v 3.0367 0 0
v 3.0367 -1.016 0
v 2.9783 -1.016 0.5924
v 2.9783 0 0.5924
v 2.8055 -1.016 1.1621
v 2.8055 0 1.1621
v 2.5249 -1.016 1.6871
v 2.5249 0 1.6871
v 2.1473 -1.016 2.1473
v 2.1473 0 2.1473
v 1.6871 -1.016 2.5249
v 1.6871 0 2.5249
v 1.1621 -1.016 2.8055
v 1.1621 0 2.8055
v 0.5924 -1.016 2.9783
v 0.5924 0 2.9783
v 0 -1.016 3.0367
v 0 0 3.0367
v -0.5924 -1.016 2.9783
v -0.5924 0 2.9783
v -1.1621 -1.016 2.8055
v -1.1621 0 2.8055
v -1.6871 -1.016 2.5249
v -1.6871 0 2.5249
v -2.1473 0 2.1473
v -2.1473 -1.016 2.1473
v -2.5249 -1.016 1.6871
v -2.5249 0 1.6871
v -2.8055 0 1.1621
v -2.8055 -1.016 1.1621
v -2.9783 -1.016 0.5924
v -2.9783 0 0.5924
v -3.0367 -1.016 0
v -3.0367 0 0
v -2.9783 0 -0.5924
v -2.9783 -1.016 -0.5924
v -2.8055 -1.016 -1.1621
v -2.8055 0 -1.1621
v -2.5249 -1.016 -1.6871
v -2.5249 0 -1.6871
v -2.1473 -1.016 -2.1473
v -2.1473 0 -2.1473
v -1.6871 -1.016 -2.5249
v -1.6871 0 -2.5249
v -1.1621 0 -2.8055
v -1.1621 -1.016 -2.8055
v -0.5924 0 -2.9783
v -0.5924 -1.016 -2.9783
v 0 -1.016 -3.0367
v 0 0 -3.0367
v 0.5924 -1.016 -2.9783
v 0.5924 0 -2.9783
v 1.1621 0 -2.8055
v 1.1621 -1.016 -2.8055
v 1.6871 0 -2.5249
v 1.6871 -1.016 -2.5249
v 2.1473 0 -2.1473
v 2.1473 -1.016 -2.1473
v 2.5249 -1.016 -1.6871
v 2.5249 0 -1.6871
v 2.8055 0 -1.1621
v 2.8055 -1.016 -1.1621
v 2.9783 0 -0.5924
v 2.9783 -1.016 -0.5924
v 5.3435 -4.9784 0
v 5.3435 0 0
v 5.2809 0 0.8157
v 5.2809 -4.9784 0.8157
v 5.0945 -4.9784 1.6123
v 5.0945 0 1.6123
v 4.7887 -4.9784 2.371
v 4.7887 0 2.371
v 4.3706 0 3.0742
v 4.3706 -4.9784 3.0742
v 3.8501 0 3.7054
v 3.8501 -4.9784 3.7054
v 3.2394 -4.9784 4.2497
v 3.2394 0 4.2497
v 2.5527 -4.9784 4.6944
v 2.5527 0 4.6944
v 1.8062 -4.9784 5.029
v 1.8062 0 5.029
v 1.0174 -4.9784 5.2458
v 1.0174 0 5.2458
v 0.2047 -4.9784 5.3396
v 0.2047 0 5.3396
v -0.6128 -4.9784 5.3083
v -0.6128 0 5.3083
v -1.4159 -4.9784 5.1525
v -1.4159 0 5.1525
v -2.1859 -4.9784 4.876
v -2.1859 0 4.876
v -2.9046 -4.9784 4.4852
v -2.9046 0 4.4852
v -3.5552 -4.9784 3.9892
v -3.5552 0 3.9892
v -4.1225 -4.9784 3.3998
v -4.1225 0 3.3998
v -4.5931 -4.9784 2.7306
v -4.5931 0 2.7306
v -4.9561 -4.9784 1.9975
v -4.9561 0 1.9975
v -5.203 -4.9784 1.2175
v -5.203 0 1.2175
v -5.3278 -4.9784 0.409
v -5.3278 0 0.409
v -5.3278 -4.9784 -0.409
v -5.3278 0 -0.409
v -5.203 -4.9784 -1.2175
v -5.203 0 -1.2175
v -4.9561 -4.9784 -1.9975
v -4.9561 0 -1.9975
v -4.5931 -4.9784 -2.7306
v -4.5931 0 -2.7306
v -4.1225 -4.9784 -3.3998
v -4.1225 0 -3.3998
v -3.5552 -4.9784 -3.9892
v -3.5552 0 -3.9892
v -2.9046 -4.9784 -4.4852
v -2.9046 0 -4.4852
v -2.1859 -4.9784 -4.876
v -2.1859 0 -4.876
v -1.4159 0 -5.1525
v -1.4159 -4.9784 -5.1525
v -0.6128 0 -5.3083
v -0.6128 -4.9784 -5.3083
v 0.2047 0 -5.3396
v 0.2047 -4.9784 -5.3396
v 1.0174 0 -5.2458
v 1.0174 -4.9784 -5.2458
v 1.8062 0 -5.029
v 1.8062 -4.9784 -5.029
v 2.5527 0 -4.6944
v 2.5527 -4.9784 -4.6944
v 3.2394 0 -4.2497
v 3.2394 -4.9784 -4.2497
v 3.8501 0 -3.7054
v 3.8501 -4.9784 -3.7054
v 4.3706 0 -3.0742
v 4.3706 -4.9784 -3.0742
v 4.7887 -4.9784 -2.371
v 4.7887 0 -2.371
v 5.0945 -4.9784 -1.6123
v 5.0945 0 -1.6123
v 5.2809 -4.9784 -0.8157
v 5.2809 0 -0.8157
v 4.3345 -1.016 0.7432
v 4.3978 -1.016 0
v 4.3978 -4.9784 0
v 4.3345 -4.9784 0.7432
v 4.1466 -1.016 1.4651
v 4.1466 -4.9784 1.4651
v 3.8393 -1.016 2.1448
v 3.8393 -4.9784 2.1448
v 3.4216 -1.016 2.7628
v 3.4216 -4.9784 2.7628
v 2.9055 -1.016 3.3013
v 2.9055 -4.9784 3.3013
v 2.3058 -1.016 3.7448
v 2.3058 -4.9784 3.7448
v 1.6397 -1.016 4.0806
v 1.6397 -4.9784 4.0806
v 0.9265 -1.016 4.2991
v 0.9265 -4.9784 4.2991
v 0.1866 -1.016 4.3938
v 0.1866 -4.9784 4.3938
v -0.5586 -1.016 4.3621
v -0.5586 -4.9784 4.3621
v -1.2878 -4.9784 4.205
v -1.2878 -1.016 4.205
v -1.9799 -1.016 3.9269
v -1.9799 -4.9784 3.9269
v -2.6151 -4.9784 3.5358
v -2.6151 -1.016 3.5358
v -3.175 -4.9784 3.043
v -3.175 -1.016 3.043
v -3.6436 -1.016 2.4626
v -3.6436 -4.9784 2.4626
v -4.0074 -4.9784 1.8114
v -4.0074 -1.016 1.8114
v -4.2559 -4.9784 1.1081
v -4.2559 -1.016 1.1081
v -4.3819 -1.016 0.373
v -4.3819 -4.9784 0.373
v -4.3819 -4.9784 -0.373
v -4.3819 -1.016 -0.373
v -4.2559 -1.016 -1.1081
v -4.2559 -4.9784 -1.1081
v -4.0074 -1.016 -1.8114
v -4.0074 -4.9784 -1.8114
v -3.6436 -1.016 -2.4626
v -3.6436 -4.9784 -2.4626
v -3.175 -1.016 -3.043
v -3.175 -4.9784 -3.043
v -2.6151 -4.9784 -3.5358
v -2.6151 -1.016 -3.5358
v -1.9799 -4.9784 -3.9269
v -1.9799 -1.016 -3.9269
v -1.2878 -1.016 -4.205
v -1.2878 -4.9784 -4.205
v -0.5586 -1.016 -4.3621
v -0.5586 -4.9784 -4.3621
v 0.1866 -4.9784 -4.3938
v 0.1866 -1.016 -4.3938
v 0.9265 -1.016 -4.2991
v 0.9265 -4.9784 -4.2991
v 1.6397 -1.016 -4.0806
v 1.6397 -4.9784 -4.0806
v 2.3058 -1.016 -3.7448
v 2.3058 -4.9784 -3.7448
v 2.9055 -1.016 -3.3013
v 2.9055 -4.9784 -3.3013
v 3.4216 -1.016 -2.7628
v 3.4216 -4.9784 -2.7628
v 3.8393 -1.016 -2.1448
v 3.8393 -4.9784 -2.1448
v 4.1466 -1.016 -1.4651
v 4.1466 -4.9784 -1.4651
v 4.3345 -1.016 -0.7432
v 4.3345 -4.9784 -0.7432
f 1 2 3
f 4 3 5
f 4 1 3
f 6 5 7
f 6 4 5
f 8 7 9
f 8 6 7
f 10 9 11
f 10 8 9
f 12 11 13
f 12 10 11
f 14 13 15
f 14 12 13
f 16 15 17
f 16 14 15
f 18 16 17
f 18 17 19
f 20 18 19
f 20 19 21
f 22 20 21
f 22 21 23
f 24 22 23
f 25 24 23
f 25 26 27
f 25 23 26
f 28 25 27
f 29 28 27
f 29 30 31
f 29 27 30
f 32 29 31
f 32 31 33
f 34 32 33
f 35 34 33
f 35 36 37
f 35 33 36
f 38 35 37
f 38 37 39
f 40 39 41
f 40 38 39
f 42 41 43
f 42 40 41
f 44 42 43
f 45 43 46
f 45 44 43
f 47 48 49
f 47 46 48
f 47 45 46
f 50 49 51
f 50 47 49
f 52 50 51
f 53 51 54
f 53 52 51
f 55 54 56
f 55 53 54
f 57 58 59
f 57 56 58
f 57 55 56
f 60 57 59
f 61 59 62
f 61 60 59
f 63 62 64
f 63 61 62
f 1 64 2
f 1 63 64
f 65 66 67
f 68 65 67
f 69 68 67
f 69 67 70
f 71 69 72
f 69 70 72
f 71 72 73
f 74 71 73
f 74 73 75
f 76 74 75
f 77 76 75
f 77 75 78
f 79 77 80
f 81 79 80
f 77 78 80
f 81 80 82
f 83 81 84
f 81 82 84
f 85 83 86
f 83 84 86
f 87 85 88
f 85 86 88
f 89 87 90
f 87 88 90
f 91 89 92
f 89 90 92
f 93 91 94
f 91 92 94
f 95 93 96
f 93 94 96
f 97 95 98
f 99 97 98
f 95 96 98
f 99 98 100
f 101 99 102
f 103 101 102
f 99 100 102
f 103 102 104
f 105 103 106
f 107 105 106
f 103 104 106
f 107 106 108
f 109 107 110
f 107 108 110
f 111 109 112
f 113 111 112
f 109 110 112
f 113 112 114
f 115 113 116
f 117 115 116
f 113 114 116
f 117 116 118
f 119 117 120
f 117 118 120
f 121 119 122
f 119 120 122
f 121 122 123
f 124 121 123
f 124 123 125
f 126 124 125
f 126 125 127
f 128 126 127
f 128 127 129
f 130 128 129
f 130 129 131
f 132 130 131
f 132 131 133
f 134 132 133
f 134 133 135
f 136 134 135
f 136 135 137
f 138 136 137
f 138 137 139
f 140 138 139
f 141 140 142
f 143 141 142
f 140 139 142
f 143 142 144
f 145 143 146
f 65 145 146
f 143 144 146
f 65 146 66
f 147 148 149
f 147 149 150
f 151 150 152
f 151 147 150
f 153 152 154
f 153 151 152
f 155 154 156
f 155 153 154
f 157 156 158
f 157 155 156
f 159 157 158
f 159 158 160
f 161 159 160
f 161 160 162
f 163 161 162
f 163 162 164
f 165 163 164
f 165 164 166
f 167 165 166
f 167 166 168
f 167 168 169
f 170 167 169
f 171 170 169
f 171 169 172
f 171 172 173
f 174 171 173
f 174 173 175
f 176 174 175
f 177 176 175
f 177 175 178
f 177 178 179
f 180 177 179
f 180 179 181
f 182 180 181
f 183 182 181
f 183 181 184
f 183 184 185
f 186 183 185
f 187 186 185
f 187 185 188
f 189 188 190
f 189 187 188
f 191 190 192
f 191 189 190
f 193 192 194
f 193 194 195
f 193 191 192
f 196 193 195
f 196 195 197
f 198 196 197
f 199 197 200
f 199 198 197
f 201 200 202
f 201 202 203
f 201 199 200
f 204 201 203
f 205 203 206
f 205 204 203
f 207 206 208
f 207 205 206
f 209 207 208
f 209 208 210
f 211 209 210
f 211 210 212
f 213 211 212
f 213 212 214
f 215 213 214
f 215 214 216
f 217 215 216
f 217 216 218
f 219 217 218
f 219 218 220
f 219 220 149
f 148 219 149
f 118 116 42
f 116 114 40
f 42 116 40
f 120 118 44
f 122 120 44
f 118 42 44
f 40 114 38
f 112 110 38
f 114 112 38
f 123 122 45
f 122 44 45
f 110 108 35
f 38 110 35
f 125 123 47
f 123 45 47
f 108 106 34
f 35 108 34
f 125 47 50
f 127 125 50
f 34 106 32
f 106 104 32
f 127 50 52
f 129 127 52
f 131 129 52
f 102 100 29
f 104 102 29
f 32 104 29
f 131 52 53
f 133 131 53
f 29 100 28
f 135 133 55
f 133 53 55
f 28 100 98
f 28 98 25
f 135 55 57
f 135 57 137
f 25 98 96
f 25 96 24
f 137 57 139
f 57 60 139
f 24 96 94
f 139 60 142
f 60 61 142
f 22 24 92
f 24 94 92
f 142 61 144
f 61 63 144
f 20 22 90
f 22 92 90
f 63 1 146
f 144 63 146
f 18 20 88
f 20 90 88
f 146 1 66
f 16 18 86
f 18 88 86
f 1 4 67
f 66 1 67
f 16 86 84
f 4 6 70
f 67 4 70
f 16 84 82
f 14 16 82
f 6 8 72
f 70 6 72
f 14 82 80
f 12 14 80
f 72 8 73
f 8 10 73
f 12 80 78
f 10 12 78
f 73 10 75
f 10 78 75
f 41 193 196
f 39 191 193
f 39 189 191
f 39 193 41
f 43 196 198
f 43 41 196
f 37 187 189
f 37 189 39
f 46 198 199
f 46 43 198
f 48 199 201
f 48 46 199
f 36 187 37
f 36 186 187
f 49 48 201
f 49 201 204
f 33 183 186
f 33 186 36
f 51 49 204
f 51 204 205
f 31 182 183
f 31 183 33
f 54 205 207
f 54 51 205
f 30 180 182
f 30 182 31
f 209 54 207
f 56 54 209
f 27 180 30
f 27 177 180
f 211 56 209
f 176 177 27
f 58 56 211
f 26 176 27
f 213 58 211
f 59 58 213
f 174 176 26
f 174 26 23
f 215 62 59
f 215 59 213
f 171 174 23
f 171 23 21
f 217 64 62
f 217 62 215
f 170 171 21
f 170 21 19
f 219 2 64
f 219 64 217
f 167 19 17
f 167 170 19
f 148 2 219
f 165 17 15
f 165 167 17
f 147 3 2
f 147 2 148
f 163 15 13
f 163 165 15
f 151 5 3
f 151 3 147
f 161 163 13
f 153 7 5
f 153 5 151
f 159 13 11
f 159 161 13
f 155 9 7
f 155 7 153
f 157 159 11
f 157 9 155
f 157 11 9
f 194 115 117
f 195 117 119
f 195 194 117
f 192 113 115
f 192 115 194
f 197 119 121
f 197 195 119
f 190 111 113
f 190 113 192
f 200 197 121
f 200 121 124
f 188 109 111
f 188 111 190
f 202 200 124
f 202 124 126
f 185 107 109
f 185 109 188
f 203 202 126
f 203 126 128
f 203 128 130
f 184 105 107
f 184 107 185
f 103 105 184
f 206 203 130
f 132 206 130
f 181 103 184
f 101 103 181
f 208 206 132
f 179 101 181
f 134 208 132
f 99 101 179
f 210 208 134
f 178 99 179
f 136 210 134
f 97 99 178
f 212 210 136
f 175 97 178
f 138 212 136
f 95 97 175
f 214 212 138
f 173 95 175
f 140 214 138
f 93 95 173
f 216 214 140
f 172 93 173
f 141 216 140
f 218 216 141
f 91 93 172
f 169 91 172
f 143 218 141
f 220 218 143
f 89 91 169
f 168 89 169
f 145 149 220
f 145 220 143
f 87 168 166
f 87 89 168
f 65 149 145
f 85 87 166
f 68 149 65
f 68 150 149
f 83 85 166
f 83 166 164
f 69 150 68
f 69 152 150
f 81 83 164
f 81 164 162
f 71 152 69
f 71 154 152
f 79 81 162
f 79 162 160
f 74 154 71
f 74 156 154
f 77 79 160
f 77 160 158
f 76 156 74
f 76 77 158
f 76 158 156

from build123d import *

# Parameters (mm, degrees)
F0_R          = 5.3435268043
F0_R_2        = 4.397766481
F1_DEPTH      = 4.9784
F2_R          = 4.6160122021
F3_DEPTH      = 1.016
F4_R          = 3.0366866858
F5_DEPTH      = 25.4
F5_DEPTH_BACK = 25.4


with BuildPart() as f1:
    # F0 (on Front) → F1 (new body)
    with BuildSketch(Plane.XZ):
        Circle(F0_R)
        Circle(F0_R_2, mode=Mode.SUBTRACT)
    extrude(amount=F1_DEPTH)

    # F2 (on Front) → F3 (join)
    with BuildSketch(Plane.XZ):
        Circle(F2_R)
    extrude(amount=F3_DEPTH)

    # F4 (on Front) → F5 (cut, two sides)
    with BuildSketch(Plane.XZ) as f5_sk:
        Circle(F4_R)
    extrude(amount=-F5_DEPTH, mode=Mode.SUBTRACT)
    extrude(f5_sk.sketch, amount=F5_DEPTH_BACK, mode=Mode.SUBTRACT)


solid = f1.part
